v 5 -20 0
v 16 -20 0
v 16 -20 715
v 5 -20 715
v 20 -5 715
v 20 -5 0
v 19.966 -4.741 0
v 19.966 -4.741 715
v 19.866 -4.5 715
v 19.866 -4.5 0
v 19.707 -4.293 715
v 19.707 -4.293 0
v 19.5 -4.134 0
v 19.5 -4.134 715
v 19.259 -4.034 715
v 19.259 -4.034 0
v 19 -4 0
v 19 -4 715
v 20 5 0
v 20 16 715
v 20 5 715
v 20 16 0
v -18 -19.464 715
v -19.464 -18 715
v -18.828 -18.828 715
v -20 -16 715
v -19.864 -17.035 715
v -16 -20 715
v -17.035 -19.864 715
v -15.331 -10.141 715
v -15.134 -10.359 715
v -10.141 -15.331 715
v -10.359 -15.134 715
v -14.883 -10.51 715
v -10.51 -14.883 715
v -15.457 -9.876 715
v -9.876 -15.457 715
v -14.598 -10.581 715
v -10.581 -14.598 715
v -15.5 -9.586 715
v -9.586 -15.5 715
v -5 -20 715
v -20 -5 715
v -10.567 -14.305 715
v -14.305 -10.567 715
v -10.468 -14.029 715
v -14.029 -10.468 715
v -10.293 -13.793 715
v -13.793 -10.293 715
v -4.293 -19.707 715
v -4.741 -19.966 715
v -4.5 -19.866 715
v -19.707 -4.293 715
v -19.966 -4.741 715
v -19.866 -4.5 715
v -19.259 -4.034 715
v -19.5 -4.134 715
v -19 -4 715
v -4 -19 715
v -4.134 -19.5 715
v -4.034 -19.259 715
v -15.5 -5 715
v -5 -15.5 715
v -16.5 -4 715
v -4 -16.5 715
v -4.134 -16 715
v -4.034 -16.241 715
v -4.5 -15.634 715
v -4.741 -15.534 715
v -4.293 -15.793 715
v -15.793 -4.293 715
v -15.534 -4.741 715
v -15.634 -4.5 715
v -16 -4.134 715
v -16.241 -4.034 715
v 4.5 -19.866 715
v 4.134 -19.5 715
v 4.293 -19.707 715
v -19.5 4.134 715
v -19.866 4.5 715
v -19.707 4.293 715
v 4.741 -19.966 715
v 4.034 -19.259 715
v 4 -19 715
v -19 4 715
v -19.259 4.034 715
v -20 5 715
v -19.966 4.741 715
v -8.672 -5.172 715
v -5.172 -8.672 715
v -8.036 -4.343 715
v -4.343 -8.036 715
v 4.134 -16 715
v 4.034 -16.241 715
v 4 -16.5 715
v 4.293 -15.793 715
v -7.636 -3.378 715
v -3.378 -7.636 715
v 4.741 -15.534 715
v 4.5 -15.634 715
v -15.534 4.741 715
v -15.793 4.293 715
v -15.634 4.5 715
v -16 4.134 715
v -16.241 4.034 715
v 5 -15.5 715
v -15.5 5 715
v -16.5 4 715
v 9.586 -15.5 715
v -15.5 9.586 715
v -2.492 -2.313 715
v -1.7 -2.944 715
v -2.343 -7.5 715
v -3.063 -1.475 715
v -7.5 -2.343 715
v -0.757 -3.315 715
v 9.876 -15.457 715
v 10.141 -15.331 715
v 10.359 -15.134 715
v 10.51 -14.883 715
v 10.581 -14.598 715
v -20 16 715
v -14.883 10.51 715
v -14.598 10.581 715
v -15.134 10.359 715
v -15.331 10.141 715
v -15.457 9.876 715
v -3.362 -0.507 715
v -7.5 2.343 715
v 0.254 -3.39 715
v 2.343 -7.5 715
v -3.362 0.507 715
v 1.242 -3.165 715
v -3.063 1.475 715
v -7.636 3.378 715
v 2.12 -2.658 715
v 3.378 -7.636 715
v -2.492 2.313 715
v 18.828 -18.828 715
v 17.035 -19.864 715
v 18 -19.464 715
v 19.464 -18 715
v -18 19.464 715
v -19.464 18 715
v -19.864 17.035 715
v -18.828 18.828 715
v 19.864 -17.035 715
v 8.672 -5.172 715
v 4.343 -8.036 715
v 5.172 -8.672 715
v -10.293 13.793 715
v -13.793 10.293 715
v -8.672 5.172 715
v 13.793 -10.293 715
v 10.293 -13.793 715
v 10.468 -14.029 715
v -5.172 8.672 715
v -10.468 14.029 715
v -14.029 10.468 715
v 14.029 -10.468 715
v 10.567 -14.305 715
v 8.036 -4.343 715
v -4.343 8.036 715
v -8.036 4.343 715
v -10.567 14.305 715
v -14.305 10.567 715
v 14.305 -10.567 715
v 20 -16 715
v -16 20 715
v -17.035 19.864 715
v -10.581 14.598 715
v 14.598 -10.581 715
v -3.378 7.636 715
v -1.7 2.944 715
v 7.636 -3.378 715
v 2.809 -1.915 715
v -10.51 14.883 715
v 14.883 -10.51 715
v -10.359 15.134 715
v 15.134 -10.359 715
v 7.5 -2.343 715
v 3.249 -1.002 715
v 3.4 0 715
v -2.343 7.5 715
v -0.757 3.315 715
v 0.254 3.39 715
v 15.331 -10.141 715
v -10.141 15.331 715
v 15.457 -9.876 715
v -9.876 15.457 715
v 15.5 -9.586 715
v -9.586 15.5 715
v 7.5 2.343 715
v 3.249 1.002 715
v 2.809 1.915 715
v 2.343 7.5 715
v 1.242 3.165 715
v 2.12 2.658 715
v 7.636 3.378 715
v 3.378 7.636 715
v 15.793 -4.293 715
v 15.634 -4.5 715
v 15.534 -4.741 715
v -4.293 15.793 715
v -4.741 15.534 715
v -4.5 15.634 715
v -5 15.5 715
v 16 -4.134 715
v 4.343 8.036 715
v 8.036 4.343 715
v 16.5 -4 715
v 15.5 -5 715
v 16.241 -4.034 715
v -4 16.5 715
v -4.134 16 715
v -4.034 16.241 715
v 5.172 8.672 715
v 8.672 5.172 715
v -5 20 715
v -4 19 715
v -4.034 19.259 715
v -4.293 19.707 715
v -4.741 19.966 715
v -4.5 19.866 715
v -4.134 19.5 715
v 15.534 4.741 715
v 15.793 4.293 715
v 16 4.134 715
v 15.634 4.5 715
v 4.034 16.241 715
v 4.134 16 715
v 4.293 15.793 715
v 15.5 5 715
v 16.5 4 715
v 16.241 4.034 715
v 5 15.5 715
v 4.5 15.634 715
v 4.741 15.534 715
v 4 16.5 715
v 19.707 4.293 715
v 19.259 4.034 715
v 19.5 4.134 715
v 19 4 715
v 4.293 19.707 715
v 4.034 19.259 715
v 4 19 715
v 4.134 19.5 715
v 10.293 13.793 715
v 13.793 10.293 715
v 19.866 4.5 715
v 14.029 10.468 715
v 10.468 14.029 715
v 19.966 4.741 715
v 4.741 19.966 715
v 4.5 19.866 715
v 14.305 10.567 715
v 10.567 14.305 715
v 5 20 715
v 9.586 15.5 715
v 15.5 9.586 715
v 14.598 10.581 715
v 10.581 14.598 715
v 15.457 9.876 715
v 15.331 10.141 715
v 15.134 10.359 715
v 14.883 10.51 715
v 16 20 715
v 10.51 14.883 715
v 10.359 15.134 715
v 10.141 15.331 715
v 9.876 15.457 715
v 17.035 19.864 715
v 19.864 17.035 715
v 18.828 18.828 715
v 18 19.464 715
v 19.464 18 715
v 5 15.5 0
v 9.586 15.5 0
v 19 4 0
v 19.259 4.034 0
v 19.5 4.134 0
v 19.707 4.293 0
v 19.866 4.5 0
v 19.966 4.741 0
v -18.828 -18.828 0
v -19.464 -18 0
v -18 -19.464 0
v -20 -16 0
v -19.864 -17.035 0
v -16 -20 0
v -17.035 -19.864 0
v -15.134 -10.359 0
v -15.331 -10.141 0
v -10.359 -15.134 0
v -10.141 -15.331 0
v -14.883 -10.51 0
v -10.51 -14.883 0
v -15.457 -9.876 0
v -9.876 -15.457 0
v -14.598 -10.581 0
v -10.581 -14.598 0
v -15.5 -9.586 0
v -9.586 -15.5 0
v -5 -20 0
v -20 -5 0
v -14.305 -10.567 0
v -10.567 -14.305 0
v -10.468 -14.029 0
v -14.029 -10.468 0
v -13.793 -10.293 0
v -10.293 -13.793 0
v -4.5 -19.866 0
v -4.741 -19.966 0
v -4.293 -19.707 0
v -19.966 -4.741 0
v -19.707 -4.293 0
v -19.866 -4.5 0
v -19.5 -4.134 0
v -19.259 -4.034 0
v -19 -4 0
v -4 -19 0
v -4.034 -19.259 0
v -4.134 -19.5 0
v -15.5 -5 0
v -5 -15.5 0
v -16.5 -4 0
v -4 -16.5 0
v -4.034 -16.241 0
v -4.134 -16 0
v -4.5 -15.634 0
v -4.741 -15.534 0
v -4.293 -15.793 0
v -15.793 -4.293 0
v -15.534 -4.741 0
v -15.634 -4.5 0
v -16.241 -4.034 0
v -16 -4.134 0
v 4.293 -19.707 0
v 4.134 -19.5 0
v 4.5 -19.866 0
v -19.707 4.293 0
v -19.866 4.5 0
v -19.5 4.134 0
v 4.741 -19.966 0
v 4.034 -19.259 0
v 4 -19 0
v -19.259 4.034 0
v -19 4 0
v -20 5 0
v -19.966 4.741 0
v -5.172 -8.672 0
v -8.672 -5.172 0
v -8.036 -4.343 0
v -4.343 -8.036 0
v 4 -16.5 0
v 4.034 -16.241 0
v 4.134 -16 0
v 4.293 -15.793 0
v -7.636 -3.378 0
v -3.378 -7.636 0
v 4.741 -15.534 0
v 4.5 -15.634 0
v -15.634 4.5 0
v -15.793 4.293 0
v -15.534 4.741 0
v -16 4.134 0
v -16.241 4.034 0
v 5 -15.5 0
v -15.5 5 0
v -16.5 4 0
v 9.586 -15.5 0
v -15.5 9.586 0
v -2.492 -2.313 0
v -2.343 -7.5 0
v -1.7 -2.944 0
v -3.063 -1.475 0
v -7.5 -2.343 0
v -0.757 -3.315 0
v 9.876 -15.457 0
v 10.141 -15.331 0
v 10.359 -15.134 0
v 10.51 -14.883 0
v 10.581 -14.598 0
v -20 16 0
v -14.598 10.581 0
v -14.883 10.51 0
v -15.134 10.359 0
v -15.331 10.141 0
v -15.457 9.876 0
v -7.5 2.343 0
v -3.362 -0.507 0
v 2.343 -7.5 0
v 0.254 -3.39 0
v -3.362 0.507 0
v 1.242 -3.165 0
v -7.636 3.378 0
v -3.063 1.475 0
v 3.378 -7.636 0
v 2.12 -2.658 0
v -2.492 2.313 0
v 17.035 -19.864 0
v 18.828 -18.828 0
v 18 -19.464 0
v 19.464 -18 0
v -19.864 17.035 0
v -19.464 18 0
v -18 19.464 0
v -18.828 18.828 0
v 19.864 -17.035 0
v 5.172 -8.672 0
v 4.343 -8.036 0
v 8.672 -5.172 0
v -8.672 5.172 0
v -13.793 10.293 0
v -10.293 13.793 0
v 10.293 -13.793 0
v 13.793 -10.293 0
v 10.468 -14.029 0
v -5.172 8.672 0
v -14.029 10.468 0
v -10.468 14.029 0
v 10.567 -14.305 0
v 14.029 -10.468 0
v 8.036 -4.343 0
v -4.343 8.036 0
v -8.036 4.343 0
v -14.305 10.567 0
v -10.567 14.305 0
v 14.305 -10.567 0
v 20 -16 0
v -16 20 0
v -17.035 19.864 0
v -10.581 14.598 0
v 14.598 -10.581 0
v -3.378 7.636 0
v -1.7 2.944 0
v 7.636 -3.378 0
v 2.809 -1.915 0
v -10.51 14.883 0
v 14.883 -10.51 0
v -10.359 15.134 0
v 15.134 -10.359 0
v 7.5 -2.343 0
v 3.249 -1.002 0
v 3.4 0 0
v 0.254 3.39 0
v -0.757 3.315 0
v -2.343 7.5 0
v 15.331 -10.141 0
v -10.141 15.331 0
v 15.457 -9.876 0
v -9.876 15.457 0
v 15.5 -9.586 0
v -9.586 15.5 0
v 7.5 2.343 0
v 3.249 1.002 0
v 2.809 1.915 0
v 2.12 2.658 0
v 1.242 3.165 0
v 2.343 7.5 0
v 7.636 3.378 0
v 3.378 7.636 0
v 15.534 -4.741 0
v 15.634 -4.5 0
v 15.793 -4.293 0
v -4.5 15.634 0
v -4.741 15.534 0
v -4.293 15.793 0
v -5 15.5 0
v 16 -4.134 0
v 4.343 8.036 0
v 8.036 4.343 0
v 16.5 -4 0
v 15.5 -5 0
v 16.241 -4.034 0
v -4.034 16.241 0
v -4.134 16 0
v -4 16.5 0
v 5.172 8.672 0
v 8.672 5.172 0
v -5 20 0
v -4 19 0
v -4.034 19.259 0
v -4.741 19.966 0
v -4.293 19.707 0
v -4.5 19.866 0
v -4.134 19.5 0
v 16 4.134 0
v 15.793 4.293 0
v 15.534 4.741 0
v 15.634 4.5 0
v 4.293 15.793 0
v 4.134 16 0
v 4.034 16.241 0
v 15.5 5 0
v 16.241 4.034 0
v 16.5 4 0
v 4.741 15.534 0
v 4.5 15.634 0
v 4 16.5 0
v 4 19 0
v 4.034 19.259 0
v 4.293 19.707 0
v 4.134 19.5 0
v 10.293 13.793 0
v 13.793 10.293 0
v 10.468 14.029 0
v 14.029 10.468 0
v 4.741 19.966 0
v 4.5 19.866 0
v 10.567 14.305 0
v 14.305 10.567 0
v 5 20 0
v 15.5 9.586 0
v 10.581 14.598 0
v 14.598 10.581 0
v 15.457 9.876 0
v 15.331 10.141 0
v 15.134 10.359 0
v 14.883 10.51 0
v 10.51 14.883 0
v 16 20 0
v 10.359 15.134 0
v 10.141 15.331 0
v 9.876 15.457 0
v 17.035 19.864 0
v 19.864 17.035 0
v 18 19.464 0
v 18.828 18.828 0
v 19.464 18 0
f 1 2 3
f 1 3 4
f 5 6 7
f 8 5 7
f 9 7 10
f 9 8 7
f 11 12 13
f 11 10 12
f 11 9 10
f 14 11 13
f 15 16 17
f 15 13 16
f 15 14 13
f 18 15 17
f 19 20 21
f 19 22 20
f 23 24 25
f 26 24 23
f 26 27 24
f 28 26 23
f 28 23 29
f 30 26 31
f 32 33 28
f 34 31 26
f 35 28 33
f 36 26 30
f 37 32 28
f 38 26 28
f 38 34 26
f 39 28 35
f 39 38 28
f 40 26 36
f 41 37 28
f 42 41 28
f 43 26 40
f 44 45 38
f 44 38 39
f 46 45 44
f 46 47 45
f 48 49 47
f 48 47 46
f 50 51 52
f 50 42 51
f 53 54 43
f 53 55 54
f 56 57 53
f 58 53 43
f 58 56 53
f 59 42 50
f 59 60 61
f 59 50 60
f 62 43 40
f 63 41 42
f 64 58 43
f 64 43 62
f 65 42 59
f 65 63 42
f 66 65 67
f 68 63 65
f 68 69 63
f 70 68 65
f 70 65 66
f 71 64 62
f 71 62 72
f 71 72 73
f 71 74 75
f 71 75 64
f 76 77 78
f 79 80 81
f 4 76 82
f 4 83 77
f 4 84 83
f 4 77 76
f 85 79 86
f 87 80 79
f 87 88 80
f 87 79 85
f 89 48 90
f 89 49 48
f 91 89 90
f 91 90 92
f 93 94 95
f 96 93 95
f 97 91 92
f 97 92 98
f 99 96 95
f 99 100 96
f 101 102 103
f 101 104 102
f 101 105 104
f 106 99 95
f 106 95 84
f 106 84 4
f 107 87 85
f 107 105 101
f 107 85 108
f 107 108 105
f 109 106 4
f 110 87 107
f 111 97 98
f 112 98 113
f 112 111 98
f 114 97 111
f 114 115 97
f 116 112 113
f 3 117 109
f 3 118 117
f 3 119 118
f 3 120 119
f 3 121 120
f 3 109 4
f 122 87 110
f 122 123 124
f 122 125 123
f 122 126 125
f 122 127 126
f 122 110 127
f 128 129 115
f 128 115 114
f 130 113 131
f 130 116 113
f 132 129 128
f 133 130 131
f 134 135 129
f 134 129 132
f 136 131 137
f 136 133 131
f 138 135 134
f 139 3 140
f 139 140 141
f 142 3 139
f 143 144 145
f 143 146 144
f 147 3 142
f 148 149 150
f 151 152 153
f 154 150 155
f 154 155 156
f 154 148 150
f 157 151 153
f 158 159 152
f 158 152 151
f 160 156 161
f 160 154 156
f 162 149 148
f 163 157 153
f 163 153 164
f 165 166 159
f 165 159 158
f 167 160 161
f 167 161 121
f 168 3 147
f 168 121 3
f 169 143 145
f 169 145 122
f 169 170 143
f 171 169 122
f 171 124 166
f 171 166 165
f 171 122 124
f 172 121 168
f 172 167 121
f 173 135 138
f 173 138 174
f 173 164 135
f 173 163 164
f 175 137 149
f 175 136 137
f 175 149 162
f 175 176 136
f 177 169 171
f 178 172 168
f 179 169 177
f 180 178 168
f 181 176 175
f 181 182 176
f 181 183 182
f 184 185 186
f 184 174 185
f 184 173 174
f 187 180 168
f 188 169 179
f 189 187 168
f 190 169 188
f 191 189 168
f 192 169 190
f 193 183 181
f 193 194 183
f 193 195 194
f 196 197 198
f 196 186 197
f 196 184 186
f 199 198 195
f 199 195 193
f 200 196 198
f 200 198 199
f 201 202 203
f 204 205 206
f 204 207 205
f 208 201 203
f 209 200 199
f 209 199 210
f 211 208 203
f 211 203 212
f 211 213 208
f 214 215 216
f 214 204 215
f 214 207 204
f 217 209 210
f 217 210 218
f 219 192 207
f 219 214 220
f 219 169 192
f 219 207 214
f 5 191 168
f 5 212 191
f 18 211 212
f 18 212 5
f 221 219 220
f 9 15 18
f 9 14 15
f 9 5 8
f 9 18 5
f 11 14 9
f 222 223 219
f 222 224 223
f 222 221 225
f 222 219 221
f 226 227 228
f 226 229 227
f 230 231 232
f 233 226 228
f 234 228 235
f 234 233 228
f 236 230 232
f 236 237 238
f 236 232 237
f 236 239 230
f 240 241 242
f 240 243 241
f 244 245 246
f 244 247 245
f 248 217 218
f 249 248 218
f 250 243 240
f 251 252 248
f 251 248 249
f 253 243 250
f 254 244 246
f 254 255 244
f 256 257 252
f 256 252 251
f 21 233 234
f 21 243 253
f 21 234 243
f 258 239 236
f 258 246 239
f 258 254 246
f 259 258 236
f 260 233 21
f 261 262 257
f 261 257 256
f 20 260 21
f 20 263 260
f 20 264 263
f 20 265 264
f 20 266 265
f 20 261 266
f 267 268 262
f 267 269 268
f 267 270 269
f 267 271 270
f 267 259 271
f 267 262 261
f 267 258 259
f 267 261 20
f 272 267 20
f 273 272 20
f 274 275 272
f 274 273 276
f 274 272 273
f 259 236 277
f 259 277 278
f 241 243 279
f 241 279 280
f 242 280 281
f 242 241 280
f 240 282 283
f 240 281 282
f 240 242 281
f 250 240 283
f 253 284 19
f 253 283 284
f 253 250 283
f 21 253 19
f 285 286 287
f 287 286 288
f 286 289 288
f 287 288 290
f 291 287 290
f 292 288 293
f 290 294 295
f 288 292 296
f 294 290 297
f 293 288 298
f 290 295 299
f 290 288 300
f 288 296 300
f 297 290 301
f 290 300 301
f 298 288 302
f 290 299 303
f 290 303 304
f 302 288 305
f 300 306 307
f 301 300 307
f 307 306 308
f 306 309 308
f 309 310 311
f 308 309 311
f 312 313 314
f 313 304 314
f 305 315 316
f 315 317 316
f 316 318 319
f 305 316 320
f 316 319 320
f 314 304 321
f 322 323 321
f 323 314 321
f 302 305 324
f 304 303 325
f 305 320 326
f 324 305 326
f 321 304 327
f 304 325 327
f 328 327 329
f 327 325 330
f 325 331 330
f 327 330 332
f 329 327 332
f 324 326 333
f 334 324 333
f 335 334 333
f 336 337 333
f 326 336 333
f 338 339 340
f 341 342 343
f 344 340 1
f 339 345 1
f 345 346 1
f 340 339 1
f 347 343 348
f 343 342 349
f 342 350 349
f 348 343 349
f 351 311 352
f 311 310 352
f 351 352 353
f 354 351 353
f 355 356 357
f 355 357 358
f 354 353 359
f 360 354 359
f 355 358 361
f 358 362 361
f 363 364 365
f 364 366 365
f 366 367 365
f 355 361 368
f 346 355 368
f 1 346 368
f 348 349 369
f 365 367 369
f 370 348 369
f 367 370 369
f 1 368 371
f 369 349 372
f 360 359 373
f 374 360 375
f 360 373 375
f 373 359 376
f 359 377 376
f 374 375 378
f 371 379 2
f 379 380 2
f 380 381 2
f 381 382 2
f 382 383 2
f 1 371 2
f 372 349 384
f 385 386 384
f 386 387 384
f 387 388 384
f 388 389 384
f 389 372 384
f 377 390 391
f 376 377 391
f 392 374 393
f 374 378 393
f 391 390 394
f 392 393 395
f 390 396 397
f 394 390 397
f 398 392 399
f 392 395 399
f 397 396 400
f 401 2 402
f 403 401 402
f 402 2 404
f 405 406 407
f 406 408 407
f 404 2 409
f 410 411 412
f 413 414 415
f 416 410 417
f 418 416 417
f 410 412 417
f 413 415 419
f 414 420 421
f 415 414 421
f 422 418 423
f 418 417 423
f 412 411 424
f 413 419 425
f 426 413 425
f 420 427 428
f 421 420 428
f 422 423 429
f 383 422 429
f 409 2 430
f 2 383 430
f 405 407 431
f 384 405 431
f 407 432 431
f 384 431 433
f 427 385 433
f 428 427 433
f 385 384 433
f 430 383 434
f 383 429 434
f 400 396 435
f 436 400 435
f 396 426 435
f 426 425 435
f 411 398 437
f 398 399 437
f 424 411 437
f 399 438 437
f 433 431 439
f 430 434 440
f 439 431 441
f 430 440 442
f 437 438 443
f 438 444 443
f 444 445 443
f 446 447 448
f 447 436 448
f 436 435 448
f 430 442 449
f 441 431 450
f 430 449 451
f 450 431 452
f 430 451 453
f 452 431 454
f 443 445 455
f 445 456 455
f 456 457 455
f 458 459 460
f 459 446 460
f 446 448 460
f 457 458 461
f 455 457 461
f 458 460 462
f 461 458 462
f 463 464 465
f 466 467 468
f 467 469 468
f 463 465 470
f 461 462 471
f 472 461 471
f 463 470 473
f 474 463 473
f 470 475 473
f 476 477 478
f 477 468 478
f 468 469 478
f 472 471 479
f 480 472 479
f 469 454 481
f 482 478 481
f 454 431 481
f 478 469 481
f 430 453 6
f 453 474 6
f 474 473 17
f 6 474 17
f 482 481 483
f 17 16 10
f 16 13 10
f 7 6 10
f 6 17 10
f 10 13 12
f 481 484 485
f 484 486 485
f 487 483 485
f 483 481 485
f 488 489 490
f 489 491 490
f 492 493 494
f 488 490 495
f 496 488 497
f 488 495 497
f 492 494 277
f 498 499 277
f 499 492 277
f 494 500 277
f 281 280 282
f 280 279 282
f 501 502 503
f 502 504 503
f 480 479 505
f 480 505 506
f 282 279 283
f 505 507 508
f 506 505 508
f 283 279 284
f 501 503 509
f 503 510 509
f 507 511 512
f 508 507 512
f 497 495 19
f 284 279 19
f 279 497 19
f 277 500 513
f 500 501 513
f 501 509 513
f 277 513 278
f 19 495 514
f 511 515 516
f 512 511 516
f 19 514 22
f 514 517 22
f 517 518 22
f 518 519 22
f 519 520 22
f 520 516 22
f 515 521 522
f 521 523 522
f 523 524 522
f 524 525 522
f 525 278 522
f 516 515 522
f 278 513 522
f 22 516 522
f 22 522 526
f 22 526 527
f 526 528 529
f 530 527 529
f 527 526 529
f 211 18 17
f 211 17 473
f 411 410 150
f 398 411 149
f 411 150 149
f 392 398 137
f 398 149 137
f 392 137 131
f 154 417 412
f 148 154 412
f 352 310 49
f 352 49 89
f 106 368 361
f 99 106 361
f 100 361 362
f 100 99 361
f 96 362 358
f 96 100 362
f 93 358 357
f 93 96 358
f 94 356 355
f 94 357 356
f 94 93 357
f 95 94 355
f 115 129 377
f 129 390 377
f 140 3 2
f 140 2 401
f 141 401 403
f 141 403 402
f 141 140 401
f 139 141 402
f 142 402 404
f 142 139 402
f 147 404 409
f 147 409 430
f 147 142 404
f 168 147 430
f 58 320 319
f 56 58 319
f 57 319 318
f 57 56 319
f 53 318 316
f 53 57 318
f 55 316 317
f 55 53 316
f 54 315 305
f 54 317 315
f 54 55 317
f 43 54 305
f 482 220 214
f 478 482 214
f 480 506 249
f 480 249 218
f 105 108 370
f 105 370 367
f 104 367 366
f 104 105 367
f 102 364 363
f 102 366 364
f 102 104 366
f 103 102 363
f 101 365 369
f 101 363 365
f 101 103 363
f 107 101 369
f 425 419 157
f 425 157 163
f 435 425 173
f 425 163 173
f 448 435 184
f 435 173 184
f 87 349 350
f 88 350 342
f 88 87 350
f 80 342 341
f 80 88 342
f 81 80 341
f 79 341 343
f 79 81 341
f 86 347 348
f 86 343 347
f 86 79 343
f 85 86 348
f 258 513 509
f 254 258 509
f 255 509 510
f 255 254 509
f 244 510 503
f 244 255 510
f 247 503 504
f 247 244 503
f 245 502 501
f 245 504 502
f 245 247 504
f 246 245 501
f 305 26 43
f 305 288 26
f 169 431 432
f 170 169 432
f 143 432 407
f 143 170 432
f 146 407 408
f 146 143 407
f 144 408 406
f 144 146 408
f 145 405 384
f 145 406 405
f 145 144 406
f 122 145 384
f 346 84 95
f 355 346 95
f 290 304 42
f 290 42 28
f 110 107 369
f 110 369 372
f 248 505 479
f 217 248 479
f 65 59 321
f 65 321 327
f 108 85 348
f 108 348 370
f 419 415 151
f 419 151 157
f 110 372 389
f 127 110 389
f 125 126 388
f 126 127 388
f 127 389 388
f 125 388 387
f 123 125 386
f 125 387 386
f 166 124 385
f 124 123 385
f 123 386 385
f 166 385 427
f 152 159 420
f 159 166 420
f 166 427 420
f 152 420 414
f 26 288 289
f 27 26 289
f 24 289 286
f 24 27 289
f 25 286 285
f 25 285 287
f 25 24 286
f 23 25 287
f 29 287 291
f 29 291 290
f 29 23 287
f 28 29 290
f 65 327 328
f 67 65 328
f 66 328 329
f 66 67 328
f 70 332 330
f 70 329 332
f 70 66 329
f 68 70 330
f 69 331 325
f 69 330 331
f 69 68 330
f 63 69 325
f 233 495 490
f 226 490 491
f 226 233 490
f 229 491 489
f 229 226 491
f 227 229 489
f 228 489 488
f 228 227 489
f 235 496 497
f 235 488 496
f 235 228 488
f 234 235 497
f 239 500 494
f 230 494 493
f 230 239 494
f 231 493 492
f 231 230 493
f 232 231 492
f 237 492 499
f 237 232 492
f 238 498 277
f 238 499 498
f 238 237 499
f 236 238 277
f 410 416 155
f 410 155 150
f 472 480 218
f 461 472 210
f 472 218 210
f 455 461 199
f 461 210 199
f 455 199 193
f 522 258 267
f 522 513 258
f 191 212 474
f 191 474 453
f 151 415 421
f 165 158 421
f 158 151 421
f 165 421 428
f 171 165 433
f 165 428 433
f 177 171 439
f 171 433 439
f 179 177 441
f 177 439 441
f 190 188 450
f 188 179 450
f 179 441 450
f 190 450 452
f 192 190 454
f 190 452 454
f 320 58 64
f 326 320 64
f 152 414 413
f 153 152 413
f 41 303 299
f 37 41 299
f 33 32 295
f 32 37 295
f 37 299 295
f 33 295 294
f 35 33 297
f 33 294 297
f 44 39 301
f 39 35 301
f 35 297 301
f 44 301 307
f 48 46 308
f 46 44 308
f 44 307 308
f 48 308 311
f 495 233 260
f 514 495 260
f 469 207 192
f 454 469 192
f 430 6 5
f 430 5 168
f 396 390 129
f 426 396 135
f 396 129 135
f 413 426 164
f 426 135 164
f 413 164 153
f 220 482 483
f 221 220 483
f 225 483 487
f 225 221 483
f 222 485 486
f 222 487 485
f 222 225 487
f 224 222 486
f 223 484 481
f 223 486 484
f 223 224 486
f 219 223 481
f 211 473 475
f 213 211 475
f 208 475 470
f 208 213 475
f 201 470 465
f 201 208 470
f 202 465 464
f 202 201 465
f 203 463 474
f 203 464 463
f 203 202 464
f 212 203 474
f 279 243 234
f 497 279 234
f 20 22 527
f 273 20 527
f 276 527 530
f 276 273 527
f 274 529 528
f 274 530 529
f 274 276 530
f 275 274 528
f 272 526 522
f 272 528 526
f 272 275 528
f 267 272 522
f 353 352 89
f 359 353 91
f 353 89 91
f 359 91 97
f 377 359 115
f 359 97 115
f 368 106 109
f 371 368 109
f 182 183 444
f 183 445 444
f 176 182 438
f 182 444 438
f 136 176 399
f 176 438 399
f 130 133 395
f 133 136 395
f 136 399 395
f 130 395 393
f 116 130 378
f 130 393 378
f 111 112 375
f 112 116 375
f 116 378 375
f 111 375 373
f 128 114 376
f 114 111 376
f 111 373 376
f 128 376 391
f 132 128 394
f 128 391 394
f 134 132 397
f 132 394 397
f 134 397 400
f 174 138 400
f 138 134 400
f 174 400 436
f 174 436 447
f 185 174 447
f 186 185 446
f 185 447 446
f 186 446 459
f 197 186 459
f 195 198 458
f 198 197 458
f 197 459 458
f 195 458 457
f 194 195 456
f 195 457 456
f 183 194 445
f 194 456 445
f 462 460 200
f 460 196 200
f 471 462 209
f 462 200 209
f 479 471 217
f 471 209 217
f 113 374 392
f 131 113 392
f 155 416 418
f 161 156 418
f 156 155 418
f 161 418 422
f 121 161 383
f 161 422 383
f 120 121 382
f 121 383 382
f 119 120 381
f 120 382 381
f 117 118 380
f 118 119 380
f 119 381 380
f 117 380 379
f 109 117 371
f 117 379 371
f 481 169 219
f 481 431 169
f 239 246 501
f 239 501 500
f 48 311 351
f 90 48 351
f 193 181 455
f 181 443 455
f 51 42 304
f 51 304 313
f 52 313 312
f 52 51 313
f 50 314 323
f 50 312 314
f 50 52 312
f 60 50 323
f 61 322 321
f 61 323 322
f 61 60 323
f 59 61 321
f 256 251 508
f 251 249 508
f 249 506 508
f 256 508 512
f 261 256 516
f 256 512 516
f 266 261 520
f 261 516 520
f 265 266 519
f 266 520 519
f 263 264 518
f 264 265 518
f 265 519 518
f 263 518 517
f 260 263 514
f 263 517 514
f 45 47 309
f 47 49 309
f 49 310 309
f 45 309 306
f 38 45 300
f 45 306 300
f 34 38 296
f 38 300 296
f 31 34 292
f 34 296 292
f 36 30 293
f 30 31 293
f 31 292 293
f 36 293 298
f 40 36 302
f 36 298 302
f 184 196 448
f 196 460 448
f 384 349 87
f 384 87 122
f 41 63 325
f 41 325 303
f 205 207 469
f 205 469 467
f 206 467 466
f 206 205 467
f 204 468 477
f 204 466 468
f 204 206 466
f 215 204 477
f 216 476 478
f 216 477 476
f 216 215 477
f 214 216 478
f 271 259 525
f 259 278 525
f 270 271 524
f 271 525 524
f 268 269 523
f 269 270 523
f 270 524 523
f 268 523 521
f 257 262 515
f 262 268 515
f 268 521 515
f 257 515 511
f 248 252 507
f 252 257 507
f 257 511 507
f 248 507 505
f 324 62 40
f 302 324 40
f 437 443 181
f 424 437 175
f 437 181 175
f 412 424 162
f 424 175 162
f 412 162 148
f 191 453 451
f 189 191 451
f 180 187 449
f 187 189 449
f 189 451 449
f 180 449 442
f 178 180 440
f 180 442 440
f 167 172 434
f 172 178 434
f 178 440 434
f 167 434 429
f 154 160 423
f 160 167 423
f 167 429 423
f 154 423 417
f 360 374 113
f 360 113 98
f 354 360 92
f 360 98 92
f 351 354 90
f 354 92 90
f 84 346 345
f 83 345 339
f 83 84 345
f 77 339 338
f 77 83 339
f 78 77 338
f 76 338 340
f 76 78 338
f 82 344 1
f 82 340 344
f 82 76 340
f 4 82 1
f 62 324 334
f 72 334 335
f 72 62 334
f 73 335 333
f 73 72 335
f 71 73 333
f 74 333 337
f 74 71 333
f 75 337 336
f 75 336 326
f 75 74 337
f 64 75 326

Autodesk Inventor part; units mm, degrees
ref_plane "YZ Plane" through (0, 0, 0) normal (1, 0, 0) x (0, 1, 0)
ref_plane "XZ Plane" through (0, 0, 0) normal (0, 1, 0) x (-1, 0, 0)
ref_plane "XY Plane" through (0, 0, 0) normal (0, 0, 1) x (1, 0, 0)
sketch "T-Slot 4040 Base" plane through (0, 0, 0) normal (0, 0, 1) x (1, 0, 0)
  line L0 (-28, 0) -> (28, 0) construction
  line L1 (0, -28) -> (0, 28) construction
  circle A0 centre (0, 0) radius 3.4
  line L2 (-7.5, -7.5) -> (7.5, -7.5)
  line L3 (7.5, -7.5) -> (7.5, 7.5)
  line L4 (7.5, 7.5) -> (-7.5, 7.5)
  line L5 (-7.5, 7.5) -> (-7.5, -7.5)
  line L6 (-7.5, -7.5) -> (7.5, 7.5) construction
  line L7 (7.5, -7.5) -> (-7.5, 7.5) construction
  line L8 (20, 4) -> (15.5, 4)
  line L9 (15.5, 4) -> (15.5, 12)
  line L10 (15.5, 12) -> (7.5, 4)
  line L11 (4, 20) -> (4, 15.5)
  line L12 (4, 15.5) -> (12, 15.5)
  line L13 (12, 15.5) -> (4, 7.5)
  line L14 (7.5, -7.5) -> (-7.5, -7.5)
  arc A1 (15.5, 9.5858) -> (13.7929, 10.2929) centre (14.5, 9.5858) ccw
  arc A2 (10.2929, 13.7929) -> (9.5858, 15.5) centre (9.5858, 14.5) ccw
  line L15 (-20, 20) -> (20, 20)
  line L16 (20, 20) -> (20, -20)
  line L17 (20, -20) -> (-20, -20)
  line L18 (-20, -20) -> (-20, 20)
  line L19 (-20, 20) -> (20, -20) construction
  line L20 (20, 20) -> (-20, -20) construction
  line L21 (-4, 15.5) -> (-12, 15.5)
  arc A3 (-9.5858, 15.5) -> (-10.2929, 13.7929) centre (-9.5858, 14.5) ccw
  line L22 (-12, 15.5) -> (-4, 7.5)
  line L23 (-15.5, 12) -> (-7.5, 4)
  line L24 (-20, 4) -> (-15.5, 4)
  arc A4 (-13.7929, 10.2929) -> (-15.5, 9.5858) centre (-14.5, 9.5858) ccw
  line L25 (-15.5, 4) -> (-15.5, 12)
  line L26 (-4, 20) -> (-4, 15.5)
  line L27 (-15.5, -4) -> (-15.5, -12)
  arc A5 (-15.5, -9.5858) -> (-13.7929, -10.2929) centre (-14.5, -9.5858) ccw
  line L28 (-15.5, -12) -> (-7.5, -4)
  line L29 (-12, -15.5) -> (-4, -7.5)
  line L30 (-4, -20) -> (-4, -15.5)
  arc A6 (-10.2929, -13.7929) -> (-9.5858, -15.5) centre (-9.5858, -14.5) ccw
  line L31 (-4, -15.5) -> (-12, -15.5)
  line L32 (-20, -4) -> (-15.5, -4)
  line L33 (4, -15.5) -> (12, -15.5)
  arc A7 (9.5858, -15.5) -> (10.2929, -13.7929) centre (9.5858, -14.5) ccw
  line L34 (12, -15.5) -> (4, -7.5)
  line L35 (15.5, -12) -> (7.5, -4)
  line L36 (20, -4) -> (15.5, -4)
  arc A8 (13.7929, -10.2929) -> (15.5, -9.5858) centre (14.5, -9.5858) ccw
  line L37 (15.5, -4) -> (15.5, -12)
  line L38 (4, -20) -> (4, -15.5)
  point P0 (4.9274, 7.75)
  point P1 (9.5858, 15.5)
  point P2 (-20, 20)
  point P3 (-7.5, -7.5)
  point P4 (-20, -20)
  point P5 (7.5, -7.5)
  point P6 (20, -20)
  point P7 (-9.5858, -15.5)
  point P8 (-4, -7.5)
  point P9 (15.5, -9.5858)
  point P10 (7.5, -4)
  point P11 (-15.5, 9.5858)
  point P12 (-4, 7.5)
  dimension "d35" = 6.8
  dimension "d37" = 12
  dimension "d38" = 1
  dimension "d43" = 40
  dimension "d44" = 40
  dimension "d45" = 4.5
  dimension "d46" = 4
  dimension "d53" = 360
extrude "Extrusion1" add sketch "T-Slot 4040 Base" along normal blind 715 contours L5 L4 L3 L2 | L2 L29 L31 L30 L17 L18 L32 L27 L28 L5 | L2 L3 L35 L37 L36 L16 L17 L38 L33 L34 | A6 L31 L29 | L23 L25 L24 L18 L15 L26 L21 L22 L4 L5 | L28 L27 A5 | L34 L33 A7 | A4 L25 L23 | L3 L4 L13 L12 L11 L15 L16 L8 L9 L10 | A8 L37 L35 | L22 L21 A3 | L10 L9 A1 | A2 L12 L13
fillet "Rundung1" radius 1 16 edges at (4, 15.5, 357.5) (15.5, 4, 357.5) (20, 4, 357.5) (4, 20, 357.5) (-20, 4, 357.5) (-15.5, 4, 357.5) (-4, 15.5, 357.5) (-4, 20, 357.5) (-4, -15.5, 357.5) (-4, -20, 357.5) (4, -15.5, 357.5) (4, -20, 357.5) (15.5, -4, 357.5) (20, -4, 357.5) (-20, -4, 357.5) (-15.5, -4, 357.5)
fillet "Rundung2" radius 4 12 edges at (4, 7.5, 357.5) (7.5, 4, 357.5) (-20, 20, 357.5) (-20, -20, 357.5) (20, 20, 357.5) (20, -20, 357.5) (7.5, -4, 357.5) (-7.5, -4, 357.5) (-7.5, 4, 357.5) (4, -7.5, 357.5) (-4, -7.5, 357.5) (-4, 7.5, 357.5)
properties part number "T-SLOT 4040 B-Type 715mm"
